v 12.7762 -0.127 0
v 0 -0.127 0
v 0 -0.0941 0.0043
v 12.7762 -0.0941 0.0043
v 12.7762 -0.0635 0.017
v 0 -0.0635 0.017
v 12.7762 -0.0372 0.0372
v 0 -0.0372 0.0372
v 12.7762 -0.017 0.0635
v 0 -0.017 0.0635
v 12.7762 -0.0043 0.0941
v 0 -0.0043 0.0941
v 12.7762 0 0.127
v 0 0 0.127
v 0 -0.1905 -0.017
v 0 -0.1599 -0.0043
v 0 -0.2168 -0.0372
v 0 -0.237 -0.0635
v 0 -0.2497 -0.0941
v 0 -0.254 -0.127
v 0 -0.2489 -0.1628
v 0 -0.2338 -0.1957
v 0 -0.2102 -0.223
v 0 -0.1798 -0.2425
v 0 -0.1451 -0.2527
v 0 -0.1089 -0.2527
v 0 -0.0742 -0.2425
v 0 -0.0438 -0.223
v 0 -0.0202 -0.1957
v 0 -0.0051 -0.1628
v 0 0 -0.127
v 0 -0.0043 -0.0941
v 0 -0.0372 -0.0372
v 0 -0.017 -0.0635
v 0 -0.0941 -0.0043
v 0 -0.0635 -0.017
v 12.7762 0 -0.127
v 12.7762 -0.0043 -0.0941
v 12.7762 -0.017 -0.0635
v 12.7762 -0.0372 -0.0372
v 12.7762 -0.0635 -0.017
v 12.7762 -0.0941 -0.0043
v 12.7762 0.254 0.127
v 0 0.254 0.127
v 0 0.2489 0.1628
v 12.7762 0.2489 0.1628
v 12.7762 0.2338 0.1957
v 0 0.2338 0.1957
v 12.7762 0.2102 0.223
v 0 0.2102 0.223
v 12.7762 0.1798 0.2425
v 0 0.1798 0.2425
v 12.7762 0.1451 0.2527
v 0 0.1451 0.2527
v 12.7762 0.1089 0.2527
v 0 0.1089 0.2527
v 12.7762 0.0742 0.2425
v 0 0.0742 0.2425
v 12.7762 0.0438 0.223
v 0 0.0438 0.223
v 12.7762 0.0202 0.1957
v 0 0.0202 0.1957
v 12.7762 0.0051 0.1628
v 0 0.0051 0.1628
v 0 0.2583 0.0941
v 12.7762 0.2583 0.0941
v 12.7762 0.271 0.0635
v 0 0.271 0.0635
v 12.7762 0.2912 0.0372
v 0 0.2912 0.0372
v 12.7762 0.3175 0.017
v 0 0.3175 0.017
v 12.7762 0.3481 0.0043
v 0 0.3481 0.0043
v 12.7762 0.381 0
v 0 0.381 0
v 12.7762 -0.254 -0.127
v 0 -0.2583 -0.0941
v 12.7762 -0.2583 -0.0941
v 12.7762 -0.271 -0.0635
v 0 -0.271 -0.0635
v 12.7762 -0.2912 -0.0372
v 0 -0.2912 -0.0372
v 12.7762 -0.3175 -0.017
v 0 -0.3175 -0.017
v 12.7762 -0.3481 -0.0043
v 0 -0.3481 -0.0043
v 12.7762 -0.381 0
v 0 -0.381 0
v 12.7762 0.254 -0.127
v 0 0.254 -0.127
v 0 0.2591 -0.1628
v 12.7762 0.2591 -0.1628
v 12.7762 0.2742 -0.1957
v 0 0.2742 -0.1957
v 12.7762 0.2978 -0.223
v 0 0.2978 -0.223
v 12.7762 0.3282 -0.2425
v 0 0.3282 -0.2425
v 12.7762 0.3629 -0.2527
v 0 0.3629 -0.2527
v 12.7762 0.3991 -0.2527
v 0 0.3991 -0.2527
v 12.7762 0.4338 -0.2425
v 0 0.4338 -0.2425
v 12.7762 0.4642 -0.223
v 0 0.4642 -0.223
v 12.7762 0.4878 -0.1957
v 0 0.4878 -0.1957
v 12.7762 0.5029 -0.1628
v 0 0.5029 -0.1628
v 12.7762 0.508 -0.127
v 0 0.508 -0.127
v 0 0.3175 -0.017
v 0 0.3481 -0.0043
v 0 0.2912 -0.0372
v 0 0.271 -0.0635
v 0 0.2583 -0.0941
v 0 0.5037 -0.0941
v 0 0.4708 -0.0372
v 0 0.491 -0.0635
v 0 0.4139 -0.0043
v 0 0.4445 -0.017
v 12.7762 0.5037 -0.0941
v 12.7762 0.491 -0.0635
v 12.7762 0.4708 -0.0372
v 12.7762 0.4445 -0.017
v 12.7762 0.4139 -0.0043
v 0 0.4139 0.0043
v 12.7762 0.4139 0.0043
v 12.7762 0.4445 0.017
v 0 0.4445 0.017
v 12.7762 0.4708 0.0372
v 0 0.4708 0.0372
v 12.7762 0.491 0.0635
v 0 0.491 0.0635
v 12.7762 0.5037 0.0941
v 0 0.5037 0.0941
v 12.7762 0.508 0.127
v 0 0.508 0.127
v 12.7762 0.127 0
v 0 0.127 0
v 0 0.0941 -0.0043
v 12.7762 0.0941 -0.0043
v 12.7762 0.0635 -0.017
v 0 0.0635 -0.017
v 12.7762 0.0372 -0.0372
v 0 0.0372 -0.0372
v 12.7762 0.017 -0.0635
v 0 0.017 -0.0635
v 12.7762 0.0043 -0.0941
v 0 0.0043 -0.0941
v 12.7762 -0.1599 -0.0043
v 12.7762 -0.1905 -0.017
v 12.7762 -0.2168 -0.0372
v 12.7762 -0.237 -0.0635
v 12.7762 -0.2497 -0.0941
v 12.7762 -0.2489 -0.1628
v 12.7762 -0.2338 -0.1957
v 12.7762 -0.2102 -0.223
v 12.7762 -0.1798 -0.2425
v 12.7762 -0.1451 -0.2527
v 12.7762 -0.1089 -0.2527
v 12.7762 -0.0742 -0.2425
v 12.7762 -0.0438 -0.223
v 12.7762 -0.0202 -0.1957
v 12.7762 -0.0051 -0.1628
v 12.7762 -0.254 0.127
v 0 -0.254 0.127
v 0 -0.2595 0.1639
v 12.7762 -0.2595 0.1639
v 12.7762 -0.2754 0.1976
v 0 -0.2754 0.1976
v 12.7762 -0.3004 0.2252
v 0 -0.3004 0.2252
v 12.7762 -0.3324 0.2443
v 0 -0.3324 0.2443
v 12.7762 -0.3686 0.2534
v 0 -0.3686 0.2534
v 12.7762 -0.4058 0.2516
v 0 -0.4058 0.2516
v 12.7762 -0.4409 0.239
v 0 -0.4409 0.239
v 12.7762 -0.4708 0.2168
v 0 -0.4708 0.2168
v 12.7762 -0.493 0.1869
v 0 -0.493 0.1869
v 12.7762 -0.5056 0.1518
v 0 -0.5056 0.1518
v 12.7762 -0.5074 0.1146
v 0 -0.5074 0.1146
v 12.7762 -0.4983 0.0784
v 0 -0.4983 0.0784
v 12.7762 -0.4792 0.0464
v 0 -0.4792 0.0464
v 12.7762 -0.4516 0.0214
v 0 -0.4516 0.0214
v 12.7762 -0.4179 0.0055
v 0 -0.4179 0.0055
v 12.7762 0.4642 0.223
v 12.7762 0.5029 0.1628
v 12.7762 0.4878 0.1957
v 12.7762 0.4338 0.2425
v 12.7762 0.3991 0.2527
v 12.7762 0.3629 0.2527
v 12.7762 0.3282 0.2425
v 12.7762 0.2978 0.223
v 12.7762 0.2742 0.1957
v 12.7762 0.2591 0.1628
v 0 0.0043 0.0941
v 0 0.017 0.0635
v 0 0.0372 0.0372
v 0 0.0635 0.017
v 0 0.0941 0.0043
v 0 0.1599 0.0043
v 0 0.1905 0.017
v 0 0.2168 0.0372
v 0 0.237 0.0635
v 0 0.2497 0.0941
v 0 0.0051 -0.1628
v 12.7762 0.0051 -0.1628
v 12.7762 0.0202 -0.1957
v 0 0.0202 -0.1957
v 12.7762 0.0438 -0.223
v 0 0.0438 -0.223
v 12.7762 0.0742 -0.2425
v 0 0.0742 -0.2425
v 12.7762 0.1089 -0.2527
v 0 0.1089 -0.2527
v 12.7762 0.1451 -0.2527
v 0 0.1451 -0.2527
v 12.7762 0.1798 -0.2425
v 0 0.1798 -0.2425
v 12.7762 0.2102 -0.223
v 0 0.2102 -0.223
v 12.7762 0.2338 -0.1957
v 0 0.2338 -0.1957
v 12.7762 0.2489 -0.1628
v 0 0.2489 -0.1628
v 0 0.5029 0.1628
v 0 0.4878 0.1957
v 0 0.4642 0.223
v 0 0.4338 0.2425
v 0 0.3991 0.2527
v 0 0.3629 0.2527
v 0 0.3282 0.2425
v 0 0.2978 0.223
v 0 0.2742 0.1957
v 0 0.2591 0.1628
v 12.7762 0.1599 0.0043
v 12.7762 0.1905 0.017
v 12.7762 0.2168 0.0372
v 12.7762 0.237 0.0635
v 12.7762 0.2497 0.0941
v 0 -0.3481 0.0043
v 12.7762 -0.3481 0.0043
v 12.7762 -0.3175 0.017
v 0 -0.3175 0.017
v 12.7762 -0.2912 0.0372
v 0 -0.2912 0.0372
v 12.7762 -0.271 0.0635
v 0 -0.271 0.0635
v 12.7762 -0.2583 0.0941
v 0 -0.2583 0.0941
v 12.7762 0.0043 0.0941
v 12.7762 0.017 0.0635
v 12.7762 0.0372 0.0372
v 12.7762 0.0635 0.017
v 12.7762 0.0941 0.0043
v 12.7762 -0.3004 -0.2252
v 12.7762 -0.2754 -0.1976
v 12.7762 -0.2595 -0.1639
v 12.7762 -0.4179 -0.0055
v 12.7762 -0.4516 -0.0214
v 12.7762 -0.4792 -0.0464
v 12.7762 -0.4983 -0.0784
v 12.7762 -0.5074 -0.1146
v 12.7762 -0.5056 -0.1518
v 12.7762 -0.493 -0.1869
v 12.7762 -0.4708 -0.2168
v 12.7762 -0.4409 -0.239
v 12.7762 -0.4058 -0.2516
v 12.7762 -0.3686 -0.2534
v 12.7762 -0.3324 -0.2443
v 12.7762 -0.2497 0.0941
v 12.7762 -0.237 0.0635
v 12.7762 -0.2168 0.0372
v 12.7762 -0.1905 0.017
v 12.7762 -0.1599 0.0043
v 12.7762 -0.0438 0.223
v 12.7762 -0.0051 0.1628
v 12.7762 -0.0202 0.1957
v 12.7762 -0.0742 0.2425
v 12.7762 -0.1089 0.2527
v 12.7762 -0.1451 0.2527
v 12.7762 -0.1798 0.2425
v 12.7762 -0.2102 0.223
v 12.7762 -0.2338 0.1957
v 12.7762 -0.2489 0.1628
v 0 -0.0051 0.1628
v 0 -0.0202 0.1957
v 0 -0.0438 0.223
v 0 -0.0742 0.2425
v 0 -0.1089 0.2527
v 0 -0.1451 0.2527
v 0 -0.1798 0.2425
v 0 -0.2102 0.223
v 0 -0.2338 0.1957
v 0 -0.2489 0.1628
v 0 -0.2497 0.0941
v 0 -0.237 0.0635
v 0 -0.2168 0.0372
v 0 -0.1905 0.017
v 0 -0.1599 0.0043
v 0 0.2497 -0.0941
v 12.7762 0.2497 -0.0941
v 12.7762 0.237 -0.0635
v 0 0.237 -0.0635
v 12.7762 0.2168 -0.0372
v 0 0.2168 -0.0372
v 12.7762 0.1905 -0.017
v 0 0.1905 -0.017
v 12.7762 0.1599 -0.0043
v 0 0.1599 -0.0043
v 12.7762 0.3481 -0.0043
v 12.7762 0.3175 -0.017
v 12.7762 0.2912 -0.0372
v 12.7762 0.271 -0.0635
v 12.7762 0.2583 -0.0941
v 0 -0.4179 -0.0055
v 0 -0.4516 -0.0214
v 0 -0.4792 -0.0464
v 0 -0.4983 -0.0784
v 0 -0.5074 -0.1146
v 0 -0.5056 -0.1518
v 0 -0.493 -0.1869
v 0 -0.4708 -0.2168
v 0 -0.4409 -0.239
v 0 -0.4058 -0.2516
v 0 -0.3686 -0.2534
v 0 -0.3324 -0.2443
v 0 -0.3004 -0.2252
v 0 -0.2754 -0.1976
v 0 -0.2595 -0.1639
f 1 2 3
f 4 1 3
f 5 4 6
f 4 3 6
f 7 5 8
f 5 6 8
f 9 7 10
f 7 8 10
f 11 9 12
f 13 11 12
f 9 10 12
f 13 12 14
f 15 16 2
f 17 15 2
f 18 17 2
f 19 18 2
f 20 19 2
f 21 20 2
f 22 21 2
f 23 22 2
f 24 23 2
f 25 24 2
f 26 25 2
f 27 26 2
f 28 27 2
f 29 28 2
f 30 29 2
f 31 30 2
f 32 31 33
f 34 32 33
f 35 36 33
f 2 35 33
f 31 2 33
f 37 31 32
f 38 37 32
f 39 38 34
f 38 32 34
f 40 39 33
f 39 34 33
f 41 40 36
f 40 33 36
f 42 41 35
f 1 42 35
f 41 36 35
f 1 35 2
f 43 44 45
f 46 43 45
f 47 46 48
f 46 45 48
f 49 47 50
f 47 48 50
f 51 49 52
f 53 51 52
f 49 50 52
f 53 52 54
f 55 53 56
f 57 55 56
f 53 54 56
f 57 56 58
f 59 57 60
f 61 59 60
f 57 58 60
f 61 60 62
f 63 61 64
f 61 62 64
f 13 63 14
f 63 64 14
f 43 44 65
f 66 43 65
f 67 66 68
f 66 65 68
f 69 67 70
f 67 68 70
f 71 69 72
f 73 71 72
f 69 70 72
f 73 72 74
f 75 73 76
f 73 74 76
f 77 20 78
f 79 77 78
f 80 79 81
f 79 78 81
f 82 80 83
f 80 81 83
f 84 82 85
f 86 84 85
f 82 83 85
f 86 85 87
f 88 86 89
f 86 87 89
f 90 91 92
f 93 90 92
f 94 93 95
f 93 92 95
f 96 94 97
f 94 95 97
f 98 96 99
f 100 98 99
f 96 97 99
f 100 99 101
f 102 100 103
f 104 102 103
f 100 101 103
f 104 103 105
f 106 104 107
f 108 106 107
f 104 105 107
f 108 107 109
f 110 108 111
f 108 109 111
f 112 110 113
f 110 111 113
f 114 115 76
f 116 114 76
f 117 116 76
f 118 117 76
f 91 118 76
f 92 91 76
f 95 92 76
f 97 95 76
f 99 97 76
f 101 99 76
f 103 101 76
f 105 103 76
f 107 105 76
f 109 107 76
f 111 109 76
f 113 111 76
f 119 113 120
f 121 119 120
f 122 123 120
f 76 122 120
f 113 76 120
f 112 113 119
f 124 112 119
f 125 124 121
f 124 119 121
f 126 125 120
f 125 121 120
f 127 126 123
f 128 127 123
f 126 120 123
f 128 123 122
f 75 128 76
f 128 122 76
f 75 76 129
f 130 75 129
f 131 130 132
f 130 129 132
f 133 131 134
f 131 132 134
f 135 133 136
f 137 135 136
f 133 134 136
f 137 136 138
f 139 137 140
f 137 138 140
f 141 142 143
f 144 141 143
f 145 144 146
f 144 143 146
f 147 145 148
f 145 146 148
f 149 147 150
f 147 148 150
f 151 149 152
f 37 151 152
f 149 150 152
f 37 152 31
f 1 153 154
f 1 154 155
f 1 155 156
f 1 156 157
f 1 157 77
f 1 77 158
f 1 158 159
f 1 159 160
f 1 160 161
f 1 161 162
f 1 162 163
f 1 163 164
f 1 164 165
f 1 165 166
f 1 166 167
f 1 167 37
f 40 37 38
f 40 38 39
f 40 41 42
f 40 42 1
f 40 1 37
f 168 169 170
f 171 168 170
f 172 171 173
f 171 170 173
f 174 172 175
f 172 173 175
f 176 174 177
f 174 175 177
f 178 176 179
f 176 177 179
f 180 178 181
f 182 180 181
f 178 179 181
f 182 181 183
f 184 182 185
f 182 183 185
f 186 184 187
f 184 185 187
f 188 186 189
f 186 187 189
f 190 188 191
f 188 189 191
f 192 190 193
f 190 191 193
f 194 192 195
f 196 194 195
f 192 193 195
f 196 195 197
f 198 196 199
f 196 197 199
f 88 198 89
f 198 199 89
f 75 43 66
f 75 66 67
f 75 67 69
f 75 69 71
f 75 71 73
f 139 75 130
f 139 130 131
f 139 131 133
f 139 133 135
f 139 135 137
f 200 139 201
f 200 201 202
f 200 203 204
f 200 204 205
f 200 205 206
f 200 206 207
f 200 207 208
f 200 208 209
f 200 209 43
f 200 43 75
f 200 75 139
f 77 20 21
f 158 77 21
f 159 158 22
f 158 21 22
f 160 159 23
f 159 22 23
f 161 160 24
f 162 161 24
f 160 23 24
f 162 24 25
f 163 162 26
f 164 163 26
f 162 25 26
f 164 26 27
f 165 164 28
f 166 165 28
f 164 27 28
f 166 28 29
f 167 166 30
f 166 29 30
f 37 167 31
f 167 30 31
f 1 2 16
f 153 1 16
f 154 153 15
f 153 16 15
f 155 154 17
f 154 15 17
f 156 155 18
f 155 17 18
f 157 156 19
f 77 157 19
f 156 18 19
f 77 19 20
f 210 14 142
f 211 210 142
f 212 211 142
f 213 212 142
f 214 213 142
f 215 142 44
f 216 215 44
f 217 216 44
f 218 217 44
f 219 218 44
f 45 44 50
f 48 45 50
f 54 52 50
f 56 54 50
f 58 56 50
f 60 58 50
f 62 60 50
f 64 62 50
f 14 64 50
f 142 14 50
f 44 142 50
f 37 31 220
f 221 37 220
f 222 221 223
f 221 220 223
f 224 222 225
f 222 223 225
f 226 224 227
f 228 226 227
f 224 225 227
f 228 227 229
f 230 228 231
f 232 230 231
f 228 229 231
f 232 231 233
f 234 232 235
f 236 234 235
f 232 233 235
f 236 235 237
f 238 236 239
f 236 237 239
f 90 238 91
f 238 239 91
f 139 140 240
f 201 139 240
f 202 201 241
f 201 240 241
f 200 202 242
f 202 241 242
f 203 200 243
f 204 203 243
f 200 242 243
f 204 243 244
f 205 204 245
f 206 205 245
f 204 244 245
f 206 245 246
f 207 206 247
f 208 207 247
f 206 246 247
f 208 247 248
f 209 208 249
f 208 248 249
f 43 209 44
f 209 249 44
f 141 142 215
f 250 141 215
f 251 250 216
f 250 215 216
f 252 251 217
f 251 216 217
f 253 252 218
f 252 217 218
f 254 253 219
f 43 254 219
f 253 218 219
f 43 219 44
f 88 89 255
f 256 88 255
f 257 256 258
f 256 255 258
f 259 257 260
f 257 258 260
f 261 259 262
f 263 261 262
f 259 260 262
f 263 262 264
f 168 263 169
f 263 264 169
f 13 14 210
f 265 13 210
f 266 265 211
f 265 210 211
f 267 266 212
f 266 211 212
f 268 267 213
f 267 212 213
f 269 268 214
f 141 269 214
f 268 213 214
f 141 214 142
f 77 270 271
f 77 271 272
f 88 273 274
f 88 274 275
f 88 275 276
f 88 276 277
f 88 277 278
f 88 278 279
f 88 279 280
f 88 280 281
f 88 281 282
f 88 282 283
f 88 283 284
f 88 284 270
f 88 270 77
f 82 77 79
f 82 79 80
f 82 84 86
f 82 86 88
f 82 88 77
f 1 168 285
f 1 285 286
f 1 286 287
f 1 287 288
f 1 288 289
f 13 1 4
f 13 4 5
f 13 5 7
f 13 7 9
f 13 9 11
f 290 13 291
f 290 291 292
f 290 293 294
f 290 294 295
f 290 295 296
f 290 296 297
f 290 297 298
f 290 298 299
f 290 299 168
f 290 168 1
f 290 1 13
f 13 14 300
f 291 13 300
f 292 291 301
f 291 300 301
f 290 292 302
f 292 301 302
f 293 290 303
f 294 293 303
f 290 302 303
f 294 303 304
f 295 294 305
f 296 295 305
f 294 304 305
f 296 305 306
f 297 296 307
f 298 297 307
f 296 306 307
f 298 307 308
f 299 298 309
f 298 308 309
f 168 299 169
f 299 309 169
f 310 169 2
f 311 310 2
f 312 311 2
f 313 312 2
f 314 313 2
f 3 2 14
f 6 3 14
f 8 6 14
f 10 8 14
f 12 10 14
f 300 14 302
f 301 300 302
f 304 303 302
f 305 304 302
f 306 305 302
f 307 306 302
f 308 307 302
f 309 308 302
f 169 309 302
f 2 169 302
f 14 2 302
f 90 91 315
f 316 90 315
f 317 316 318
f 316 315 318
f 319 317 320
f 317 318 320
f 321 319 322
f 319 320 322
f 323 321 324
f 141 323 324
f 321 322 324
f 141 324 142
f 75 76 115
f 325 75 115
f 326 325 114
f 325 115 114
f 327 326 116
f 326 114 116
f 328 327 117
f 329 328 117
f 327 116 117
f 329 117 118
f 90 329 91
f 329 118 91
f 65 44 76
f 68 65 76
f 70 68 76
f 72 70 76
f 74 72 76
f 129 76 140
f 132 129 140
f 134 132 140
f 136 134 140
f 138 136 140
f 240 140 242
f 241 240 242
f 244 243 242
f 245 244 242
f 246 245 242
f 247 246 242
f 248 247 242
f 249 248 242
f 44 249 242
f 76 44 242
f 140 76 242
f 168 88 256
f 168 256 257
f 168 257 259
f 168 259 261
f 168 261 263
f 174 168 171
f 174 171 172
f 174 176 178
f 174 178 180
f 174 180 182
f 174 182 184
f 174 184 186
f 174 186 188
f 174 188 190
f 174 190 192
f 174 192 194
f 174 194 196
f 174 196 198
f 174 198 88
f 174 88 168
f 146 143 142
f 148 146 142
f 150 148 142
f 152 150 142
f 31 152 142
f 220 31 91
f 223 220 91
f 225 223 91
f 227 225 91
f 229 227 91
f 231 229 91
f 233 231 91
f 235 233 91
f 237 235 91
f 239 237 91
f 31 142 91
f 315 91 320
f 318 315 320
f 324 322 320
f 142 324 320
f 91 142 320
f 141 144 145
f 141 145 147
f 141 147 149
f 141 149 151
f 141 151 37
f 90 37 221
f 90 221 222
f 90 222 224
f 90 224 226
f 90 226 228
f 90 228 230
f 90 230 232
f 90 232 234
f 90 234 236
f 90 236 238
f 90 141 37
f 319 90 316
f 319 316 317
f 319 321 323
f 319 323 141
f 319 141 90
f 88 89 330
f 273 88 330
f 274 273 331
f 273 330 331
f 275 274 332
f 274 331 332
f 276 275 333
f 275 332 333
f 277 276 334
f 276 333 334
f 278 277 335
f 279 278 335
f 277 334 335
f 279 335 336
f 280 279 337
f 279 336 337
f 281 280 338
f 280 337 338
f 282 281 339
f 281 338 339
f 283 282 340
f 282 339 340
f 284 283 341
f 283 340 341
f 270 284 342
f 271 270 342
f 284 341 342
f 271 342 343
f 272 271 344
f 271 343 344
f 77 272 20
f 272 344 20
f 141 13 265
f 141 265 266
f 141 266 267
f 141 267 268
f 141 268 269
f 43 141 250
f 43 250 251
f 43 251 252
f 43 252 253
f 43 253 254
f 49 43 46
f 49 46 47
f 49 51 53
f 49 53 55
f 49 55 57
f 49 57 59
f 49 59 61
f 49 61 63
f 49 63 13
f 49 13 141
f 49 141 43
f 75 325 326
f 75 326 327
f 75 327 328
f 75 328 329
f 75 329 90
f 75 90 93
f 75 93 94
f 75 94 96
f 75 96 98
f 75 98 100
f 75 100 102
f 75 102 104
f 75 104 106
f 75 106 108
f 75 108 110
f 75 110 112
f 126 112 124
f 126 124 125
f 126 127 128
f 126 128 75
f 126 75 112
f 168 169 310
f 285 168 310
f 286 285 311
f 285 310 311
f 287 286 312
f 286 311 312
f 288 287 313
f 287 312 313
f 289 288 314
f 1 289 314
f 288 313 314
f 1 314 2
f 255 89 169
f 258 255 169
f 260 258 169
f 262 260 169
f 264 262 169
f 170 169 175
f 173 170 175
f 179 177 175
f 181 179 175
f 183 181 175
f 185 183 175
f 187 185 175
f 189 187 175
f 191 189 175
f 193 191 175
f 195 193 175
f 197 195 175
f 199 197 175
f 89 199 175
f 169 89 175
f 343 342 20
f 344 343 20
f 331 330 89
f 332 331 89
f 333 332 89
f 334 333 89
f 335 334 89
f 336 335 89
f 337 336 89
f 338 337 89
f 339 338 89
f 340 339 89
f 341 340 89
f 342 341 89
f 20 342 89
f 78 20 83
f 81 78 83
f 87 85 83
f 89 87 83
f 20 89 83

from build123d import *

# Parameters (mm, degrees)
F1_DEPTH = 12.7762


with BuildPart() as f1:
    # F0 (on Right) → F1 (new body)
    with BuildSketch(Plane.YZ):
        with BuildLine():
            ThreePointArc((-0.381, 0), (-0.291197, 0.037197), (-0.254, 0.127))
            ThreePointArc((-0.254, 0.127), (-0.470803, 0.216803), (-0.381, 0))
        make_face()
        with BuildLine():
            ThreePointArc((0, 0.127), (-0.127, 0.254), (-0.254, 0.127))
            ThreePointArc((-0.254, 0.127), (-0.216803, 0.037197), (-0.127, 0))
            ThreePointArc((-0.127, 0), (-0.037197, 0.037197), (0, 0.127))
        make_face()
        with BuildLine():
            ThreePointArc((0, -0.127), (-0.037197, -0.037197), (-0.127, 0))
            ThreePointArc((-0.127, 0), (-0.216803, -0.037197), (-0.254, -0.127))
            ThreePointArc((-0.254, -0.127), (-0.127, -0.254), (0, -0.127))
        make_face()
        with BuildLine():
            ThreePointArc((0.254, 0.127), (0.127, 0.254), (0, 0.127))
            ThreePointArc((0, 0.127), (0.037197, 0.037197), (0.127, 0))
            ThreePointArc((0.127, 0), (0.216803, 0.037197), (0.254, 0.127))
        make_face()
        with BuildLine():
            ThreePointArc((-0.254, -0.127), (-0.291197, -0.037197), (-0.381, 0))
            ThreePointArc((-0.381, 0), (-0.470803, -0.216803), (-0.254, -0.127))
        make_face()
        with BuildLine():
            ThreePointArc((0.254, -0.127), (0.216803, -0.037197), (0.127, 0))
            ThreePointArc((0.127, 0), (0.037197, -0.037197), (0, -0.127))
            ThreePointArc((0, -0.127), (0.127, -0.254), (0.254, -0.127))
        make_face()
        with BuildLine():
            ThreePointArc((0.508, 0.127), (0.381, 0.254), (0.254, 0.127))
            ThreePointArc((0.254, 0.127), (0.291197, 0.037197), (0.381, 0))
            ThreePointArc((0.381, 0), (0.470803, 0.037197), (0.508, 0.127))
        make_face()
        with BuildLine():
            ThreePointArc((0.508, -0.127), (0.470803, -0.037197), (0.381, 0))
            ThreePointArc((0.381, 0), (0.291197, -0.037197), (0.254, -0.127))
            ThreePointArc((0.254, -0.127), (0.381, -0.254), (0.508, -0.127))
        make_face()
    extrude(amount=F1_DEPTH)


solid = f1.part
